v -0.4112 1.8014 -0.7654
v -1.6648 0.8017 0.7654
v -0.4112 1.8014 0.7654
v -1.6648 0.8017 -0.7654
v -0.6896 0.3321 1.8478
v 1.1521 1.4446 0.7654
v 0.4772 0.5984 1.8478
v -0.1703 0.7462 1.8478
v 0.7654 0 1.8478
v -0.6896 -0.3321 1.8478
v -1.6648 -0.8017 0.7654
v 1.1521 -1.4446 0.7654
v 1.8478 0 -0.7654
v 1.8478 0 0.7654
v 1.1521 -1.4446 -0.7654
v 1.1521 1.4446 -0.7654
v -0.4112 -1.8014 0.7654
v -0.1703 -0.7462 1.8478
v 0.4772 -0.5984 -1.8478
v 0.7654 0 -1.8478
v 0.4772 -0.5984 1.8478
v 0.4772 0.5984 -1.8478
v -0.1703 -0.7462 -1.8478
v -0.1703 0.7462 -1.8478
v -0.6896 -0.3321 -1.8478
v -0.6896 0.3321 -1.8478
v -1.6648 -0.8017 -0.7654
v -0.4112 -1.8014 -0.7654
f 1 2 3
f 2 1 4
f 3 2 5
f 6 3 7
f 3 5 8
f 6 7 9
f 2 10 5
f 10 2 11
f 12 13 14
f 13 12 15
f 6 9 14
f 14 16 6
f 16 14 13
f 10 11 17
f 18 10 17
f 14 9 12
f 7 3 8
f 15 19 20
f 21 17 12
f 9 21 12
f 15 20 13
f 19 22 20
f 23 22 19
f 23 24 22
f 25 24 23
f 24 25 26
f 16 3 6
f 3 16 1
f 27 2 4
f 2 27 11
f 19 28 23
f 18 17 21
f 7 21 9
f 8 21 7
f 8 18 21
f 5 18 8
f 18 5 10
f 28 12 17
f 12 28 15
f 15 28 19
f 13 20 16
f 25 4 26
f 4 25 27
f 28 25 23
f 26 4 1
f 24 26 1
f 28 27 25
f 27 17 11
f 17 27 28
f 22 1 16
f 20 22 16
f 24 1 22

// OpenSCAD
tent_angle=15;
tent_rotate=[0, tent_angle, 0];
offset_x=-35;
bottom_padding=0;
pcb_depth=6;
slop=0.9;
caseRounding=2;
casePadding=5;
pcbLip=-8;

main();

module caseOutline() {
    hull() {
        offset(casePadding)
        pcb2D();
    }
}

module caseOutlineMinOffset() {
    hull() {
        offset(casePadding-caseRounding)
        pcb2D();
    }
}

module pcb3D() {
    translate([0, 0, -pcb_depth+0.1])
        linear_extrude(height=pcb_depth, center=false, convexity=10)
        pcb2D();
}

module pcb2D() {
    translate([offset_x, 0, 0])
        rotate([0, 180, -5])
        offset(r=slop)
        import(file = "panel.dxf", $fn=100, convexity=10);
}

module main() {
    difference() {
        // primary tent shape
        union() {
            // bottom padding
            translate([0, 0, -bottom_padding]) 
                linear_extrude(bottom_padding)
                projection(cut = false)
                linear_extrude(height=0.1, center=false, convexity=10)
                rotate(a=tent_rotate)
                caseOutline();
                
            minkowski() {               
                // wedge
                difference() {        
                    linear_extrude(100)
                        projection(cut = false)
                        rotate(a=tent_rotate)
                        difference() {
                            linear_extrude(height=0.1, center=false, convexity=10)
                                caseOutlineMinOffset();
                            // battery/mcu cutout 
                            translate([-132+offset_x, 31, -10])
                                cube([50, 70, 90]);
                        }
                        
                        
                    // cut out wedge on angle
                    rotate(a=tent_rotate)
                        translate([-250, -80, -caseRounding])
                        cube([250, 350, 100]);
                }
                sphere(caseRounding);
            }
        }

        // pcb inset cutout
        translate([0, 0, 0])
            rotate(a=tent_rotate)
            pcb3D();

        // inner hole
        difference() {
            translate([0, 0, -10])
                linear_extrude(height=100, center=false, convexity=10)
                projection(cut = false)
                linear_extrude(height=0.1, center=false, convexity=10)
                rotate(a=tent_rotate)
                offset(pcbLip)
                pcb2D();
            // extra strength for outter edge
            rotate([0, 0, -20])
                translate([-21+offset_x, -22, -pcb_depth-bottom_padding]) 
                cube([20, 48, 30]);
        } 

        // bottom text
        translate([-50, -10, -bottom_padding-1.6])
            rotate([180, 0, 90])
            linear_extrude(1)
            text(str(tent_angle, "°"));
    }
}
